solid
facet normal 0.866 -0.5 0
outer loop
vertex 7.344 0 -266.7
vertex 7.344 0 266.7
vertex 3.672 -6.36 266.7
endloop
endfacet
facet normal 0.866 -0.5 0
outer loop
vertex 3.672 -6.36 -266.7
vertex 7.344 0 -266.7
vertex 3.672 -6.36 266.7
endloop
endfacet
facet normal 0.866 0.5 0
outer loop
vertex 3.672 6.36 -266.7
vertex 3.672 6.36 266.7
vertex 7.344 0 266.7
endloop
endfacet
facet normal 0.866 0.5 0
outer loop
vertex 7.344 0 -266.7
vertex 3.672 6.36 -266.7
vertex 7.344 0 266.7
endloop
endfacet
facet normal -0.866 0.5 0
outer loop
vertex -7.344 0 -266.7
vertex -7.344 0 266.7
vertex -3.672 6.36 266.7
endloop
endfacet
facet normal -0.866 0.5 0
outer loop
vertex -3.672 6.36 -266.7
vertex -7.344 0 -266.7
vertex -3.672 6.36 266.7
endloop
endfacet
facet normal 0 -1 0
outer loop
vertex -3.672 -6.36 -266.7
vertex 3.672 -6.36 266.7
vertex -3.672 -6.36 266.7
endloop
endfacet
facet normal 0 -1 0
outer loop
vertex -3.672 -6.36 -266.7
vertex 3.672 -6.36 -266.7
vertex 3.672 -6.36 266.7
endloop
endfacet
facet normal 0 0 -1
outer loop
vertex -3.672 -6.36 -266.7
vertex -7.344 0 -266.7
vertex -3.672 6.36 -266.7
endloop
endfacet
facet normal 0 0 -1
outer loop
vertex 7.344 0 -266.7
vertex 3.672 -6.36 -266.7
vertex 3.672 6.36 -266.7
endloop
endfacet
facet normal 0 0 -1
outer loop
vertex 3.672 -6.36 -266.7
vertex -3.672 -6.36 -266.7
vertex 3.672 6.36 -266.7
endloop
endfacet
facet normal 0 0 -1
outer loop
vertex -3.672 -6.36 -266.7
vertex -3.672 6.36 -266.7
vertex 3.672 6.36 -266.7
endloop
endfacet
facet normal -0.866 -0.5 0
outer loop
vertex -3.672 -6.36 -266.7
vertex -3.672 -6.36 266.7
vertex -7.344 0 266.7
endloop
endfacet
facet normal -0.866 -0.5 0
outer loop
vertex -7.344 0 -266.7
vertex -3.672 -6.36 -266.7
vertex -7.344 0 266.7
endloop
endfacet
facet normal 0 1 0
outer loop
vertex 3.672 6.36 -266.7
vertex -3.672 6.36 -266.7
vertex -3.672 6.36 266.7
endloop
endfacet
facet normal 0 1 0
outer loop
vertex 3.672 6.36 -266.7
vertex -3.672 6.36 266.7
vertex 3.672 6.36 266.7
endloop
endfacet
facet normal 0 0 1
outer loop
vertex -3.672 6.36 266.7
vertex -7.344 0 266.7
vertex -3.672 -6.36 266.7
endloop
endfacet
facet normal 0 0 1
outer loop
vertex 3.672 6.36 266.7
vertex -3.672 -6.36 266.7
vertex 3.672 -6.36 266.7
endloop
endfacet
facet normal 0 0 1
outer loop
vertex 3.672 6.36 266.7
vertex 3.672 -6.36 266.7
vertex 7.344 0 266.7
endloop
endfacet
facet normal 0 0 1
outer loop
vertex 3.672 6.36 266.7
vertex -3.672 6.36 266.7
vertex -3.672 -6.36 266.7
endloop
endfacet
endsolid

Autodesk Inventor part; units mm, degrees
ref_plane "YZ Plane" through (0, 0, 0) normal (1, 0, 0) x (0, 1, 0)
ref_plane "XZ Plane" through (0, 0, 0) normal (0, 1, 0) x (-1, 0, 0)
ref_plane "XY Plane" through (0, 0, 0) normal (0, 0, 1) x (1, 0, 0)
sketch "Sketch1" plane through (0, 0, 0) normal (0, 0, 1) x (1, 0, 0)
  line L0 (-3.6719, 6.36) -> (3.6719, 6.36)
  line L1 (3.6719, 6.36) -> (7.3439, 0)
  line L2 (7.3439, 0) -> (3.6719, -6.36)
  line L3 (3.6719, -6.36) -> (-3.6719, -6.36)
  line L4 (-3.6719, -6.36) -> (-7.3439, 0)
  line L5 (-7.3439, 0) -> (-3.6719, 6.36)
  point P0 (0, 0)
  point P1 (0, 0)
  dimension "d0" = 7.3439
extrude "Extrusion1" add sketch "Sketch1" along normal mid plane 533.4
properties part number "Hex_shaft"
